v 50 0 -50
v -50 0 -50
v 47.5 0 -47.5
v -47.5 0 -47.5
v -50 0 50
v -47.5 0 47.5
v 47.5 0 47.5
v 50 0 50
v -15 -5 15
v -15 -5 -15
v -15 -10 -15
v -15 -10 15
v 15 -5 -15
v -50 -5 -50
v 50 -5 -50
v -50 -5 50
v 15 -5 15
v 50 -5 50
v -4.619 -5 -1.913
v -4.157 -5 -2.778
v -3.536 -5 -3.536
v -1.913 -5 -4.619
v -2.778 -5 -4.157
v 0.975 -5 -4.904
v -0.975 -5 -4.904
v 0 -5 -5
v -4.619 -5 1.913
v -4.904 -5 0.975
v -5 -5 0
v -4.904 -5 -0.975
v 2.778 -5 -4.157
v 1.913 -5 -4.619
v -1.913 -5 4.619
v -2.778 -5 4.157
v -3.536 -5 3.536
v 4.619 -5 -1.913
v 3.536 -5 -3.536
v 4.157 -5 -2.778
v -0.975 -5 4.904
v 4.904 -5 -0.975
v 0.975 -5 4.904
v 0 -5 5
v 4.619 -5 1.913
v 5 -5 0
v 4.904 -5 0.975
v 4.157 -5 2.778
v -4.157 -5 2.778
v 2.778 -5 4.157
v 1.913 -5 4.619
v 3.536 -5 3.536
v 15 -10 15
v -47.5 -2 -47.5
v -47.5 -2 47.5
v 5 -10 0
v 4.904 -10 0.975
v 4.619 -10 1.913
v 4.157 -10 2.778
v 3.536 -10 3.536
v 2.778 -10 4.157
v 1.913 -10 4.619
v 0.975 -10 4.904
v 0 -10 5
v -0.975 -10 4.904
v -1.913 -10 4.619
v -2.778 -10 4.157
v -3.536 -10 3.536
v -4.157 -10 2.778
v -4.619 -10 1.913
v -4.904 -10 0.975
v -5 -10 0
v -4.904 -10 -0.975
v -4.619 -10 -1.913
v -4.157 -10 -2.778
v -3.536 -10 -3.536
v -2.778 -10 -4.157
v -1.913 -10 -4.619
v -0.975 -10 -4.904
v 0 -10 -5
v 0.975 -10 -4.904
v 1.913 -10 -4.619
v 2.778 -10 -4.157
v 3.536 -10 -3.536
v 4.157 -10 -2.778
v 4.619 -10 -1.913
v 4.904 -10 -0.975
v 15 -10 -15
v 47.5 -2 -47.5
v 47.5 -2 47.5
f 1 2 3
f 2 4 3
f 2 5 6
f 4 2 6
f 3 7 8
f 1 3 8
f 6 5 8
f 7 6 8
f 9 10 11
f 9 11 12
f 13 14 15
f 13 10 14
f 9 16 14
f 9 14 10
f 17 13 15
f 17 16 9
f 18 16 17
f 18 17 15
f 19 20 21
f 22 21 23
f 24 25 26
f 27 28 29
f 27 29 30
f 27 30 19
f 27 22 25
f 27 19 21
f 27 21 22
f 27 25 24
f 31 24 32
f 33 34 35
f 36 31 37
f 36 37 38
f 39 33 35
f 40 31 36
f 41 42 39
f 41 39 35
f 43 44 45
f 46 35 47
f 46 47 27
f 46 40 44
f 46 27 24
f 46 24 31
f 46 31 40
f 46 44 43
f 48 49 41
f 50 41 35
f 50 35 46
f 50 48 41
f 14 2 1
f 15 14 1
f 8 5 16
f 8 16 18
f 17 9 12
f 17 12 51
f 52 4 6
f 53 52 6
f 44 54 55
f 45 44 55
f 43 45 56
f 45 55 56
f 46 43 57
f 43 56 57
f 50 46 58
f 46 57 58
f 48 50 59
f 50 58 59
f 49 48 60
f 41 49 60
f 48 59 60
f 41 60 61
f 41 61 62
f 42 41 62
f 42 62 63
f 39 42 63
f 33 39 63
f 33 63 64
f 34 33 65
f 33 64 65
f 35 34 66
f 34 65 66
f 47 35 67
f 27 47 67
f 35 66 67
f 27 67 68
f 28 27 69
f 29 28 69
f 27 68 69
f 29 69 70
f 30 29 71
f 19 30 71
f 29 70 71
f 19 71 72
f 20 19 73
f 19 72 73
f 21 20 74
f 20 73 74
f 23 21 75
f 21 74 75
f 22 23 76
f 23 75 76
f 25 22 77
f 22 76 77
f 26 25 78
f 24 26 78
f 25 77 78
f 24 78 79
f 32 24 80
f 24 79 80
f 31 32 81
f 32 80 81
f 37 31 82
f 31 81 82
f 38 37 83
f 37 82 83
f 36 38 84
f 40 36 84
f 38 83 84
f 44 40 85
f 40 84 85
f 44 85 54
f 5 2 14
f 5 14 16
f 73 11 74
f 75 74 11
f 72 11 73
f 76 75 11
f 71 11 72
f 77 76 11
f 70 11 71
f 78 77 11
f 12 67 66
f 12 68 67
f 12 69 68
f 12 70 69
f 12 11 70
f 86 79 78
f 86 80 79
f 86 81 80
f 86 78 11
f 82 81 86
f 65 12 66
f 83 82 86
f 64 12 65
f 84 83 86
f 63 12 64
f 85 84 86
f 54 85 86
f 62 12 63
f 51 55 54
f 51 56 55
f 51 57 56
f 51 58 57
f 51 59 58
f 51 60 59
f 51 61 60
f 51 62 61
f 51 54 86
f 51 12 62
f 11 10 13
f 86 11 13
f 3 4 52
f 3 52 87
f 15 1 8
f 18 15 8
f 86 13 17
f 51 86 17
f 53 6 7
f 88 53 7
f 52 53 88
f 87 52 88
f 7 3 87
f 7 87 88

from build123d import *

# Parameters (mm, degrees)
F0_W     = 100
F0_H     = 100
F0_W_2   = 95
F0_H_2   = 95
F1_DEPTH = 5
F2_DEPTH = 2
F3_W     = 30
F3_H     = 30
F4_DEPTH = 5
F5_R     = 5
F6_DEPTH = 5


with BuildPart() as f1:
    # F0 (on Front) → F1 (new body)
    with BuildSketch(Plane.XZ):
        Rectangle(F0_W, F0_H)
        Rectangle(F0_W_2, F0_H_2, mode=Mode.SUBTRACT)
        Rectangle(F0_W_2, F0_H_2)
    extrude(amount=F1_DEPTH)

    # F0 (on Front) → F2 (cut)
    with BuildSketch(Plane.XZ):
        Rectangle(F0_W_2, F0_H_2)
    extrude(amount=F2_DEPTH, mode=Mode.SUBTRACT)

    # F3 (on face) → F4 (join)
    with BuildSketch(Plane.XZ.offset(5)):
        Rectangle(F3_W, F3_H)
    extrude(amount=F4_DEPTH)

    # F5 (on face) → F6 (cut)
    with BuildSketch(Plane.XZ.offset(10)):
        Circle(F5_R)
    extrude(amount=-F6_DEPTH, mode=Mode.SUBTRACT)


solid = f1.part
